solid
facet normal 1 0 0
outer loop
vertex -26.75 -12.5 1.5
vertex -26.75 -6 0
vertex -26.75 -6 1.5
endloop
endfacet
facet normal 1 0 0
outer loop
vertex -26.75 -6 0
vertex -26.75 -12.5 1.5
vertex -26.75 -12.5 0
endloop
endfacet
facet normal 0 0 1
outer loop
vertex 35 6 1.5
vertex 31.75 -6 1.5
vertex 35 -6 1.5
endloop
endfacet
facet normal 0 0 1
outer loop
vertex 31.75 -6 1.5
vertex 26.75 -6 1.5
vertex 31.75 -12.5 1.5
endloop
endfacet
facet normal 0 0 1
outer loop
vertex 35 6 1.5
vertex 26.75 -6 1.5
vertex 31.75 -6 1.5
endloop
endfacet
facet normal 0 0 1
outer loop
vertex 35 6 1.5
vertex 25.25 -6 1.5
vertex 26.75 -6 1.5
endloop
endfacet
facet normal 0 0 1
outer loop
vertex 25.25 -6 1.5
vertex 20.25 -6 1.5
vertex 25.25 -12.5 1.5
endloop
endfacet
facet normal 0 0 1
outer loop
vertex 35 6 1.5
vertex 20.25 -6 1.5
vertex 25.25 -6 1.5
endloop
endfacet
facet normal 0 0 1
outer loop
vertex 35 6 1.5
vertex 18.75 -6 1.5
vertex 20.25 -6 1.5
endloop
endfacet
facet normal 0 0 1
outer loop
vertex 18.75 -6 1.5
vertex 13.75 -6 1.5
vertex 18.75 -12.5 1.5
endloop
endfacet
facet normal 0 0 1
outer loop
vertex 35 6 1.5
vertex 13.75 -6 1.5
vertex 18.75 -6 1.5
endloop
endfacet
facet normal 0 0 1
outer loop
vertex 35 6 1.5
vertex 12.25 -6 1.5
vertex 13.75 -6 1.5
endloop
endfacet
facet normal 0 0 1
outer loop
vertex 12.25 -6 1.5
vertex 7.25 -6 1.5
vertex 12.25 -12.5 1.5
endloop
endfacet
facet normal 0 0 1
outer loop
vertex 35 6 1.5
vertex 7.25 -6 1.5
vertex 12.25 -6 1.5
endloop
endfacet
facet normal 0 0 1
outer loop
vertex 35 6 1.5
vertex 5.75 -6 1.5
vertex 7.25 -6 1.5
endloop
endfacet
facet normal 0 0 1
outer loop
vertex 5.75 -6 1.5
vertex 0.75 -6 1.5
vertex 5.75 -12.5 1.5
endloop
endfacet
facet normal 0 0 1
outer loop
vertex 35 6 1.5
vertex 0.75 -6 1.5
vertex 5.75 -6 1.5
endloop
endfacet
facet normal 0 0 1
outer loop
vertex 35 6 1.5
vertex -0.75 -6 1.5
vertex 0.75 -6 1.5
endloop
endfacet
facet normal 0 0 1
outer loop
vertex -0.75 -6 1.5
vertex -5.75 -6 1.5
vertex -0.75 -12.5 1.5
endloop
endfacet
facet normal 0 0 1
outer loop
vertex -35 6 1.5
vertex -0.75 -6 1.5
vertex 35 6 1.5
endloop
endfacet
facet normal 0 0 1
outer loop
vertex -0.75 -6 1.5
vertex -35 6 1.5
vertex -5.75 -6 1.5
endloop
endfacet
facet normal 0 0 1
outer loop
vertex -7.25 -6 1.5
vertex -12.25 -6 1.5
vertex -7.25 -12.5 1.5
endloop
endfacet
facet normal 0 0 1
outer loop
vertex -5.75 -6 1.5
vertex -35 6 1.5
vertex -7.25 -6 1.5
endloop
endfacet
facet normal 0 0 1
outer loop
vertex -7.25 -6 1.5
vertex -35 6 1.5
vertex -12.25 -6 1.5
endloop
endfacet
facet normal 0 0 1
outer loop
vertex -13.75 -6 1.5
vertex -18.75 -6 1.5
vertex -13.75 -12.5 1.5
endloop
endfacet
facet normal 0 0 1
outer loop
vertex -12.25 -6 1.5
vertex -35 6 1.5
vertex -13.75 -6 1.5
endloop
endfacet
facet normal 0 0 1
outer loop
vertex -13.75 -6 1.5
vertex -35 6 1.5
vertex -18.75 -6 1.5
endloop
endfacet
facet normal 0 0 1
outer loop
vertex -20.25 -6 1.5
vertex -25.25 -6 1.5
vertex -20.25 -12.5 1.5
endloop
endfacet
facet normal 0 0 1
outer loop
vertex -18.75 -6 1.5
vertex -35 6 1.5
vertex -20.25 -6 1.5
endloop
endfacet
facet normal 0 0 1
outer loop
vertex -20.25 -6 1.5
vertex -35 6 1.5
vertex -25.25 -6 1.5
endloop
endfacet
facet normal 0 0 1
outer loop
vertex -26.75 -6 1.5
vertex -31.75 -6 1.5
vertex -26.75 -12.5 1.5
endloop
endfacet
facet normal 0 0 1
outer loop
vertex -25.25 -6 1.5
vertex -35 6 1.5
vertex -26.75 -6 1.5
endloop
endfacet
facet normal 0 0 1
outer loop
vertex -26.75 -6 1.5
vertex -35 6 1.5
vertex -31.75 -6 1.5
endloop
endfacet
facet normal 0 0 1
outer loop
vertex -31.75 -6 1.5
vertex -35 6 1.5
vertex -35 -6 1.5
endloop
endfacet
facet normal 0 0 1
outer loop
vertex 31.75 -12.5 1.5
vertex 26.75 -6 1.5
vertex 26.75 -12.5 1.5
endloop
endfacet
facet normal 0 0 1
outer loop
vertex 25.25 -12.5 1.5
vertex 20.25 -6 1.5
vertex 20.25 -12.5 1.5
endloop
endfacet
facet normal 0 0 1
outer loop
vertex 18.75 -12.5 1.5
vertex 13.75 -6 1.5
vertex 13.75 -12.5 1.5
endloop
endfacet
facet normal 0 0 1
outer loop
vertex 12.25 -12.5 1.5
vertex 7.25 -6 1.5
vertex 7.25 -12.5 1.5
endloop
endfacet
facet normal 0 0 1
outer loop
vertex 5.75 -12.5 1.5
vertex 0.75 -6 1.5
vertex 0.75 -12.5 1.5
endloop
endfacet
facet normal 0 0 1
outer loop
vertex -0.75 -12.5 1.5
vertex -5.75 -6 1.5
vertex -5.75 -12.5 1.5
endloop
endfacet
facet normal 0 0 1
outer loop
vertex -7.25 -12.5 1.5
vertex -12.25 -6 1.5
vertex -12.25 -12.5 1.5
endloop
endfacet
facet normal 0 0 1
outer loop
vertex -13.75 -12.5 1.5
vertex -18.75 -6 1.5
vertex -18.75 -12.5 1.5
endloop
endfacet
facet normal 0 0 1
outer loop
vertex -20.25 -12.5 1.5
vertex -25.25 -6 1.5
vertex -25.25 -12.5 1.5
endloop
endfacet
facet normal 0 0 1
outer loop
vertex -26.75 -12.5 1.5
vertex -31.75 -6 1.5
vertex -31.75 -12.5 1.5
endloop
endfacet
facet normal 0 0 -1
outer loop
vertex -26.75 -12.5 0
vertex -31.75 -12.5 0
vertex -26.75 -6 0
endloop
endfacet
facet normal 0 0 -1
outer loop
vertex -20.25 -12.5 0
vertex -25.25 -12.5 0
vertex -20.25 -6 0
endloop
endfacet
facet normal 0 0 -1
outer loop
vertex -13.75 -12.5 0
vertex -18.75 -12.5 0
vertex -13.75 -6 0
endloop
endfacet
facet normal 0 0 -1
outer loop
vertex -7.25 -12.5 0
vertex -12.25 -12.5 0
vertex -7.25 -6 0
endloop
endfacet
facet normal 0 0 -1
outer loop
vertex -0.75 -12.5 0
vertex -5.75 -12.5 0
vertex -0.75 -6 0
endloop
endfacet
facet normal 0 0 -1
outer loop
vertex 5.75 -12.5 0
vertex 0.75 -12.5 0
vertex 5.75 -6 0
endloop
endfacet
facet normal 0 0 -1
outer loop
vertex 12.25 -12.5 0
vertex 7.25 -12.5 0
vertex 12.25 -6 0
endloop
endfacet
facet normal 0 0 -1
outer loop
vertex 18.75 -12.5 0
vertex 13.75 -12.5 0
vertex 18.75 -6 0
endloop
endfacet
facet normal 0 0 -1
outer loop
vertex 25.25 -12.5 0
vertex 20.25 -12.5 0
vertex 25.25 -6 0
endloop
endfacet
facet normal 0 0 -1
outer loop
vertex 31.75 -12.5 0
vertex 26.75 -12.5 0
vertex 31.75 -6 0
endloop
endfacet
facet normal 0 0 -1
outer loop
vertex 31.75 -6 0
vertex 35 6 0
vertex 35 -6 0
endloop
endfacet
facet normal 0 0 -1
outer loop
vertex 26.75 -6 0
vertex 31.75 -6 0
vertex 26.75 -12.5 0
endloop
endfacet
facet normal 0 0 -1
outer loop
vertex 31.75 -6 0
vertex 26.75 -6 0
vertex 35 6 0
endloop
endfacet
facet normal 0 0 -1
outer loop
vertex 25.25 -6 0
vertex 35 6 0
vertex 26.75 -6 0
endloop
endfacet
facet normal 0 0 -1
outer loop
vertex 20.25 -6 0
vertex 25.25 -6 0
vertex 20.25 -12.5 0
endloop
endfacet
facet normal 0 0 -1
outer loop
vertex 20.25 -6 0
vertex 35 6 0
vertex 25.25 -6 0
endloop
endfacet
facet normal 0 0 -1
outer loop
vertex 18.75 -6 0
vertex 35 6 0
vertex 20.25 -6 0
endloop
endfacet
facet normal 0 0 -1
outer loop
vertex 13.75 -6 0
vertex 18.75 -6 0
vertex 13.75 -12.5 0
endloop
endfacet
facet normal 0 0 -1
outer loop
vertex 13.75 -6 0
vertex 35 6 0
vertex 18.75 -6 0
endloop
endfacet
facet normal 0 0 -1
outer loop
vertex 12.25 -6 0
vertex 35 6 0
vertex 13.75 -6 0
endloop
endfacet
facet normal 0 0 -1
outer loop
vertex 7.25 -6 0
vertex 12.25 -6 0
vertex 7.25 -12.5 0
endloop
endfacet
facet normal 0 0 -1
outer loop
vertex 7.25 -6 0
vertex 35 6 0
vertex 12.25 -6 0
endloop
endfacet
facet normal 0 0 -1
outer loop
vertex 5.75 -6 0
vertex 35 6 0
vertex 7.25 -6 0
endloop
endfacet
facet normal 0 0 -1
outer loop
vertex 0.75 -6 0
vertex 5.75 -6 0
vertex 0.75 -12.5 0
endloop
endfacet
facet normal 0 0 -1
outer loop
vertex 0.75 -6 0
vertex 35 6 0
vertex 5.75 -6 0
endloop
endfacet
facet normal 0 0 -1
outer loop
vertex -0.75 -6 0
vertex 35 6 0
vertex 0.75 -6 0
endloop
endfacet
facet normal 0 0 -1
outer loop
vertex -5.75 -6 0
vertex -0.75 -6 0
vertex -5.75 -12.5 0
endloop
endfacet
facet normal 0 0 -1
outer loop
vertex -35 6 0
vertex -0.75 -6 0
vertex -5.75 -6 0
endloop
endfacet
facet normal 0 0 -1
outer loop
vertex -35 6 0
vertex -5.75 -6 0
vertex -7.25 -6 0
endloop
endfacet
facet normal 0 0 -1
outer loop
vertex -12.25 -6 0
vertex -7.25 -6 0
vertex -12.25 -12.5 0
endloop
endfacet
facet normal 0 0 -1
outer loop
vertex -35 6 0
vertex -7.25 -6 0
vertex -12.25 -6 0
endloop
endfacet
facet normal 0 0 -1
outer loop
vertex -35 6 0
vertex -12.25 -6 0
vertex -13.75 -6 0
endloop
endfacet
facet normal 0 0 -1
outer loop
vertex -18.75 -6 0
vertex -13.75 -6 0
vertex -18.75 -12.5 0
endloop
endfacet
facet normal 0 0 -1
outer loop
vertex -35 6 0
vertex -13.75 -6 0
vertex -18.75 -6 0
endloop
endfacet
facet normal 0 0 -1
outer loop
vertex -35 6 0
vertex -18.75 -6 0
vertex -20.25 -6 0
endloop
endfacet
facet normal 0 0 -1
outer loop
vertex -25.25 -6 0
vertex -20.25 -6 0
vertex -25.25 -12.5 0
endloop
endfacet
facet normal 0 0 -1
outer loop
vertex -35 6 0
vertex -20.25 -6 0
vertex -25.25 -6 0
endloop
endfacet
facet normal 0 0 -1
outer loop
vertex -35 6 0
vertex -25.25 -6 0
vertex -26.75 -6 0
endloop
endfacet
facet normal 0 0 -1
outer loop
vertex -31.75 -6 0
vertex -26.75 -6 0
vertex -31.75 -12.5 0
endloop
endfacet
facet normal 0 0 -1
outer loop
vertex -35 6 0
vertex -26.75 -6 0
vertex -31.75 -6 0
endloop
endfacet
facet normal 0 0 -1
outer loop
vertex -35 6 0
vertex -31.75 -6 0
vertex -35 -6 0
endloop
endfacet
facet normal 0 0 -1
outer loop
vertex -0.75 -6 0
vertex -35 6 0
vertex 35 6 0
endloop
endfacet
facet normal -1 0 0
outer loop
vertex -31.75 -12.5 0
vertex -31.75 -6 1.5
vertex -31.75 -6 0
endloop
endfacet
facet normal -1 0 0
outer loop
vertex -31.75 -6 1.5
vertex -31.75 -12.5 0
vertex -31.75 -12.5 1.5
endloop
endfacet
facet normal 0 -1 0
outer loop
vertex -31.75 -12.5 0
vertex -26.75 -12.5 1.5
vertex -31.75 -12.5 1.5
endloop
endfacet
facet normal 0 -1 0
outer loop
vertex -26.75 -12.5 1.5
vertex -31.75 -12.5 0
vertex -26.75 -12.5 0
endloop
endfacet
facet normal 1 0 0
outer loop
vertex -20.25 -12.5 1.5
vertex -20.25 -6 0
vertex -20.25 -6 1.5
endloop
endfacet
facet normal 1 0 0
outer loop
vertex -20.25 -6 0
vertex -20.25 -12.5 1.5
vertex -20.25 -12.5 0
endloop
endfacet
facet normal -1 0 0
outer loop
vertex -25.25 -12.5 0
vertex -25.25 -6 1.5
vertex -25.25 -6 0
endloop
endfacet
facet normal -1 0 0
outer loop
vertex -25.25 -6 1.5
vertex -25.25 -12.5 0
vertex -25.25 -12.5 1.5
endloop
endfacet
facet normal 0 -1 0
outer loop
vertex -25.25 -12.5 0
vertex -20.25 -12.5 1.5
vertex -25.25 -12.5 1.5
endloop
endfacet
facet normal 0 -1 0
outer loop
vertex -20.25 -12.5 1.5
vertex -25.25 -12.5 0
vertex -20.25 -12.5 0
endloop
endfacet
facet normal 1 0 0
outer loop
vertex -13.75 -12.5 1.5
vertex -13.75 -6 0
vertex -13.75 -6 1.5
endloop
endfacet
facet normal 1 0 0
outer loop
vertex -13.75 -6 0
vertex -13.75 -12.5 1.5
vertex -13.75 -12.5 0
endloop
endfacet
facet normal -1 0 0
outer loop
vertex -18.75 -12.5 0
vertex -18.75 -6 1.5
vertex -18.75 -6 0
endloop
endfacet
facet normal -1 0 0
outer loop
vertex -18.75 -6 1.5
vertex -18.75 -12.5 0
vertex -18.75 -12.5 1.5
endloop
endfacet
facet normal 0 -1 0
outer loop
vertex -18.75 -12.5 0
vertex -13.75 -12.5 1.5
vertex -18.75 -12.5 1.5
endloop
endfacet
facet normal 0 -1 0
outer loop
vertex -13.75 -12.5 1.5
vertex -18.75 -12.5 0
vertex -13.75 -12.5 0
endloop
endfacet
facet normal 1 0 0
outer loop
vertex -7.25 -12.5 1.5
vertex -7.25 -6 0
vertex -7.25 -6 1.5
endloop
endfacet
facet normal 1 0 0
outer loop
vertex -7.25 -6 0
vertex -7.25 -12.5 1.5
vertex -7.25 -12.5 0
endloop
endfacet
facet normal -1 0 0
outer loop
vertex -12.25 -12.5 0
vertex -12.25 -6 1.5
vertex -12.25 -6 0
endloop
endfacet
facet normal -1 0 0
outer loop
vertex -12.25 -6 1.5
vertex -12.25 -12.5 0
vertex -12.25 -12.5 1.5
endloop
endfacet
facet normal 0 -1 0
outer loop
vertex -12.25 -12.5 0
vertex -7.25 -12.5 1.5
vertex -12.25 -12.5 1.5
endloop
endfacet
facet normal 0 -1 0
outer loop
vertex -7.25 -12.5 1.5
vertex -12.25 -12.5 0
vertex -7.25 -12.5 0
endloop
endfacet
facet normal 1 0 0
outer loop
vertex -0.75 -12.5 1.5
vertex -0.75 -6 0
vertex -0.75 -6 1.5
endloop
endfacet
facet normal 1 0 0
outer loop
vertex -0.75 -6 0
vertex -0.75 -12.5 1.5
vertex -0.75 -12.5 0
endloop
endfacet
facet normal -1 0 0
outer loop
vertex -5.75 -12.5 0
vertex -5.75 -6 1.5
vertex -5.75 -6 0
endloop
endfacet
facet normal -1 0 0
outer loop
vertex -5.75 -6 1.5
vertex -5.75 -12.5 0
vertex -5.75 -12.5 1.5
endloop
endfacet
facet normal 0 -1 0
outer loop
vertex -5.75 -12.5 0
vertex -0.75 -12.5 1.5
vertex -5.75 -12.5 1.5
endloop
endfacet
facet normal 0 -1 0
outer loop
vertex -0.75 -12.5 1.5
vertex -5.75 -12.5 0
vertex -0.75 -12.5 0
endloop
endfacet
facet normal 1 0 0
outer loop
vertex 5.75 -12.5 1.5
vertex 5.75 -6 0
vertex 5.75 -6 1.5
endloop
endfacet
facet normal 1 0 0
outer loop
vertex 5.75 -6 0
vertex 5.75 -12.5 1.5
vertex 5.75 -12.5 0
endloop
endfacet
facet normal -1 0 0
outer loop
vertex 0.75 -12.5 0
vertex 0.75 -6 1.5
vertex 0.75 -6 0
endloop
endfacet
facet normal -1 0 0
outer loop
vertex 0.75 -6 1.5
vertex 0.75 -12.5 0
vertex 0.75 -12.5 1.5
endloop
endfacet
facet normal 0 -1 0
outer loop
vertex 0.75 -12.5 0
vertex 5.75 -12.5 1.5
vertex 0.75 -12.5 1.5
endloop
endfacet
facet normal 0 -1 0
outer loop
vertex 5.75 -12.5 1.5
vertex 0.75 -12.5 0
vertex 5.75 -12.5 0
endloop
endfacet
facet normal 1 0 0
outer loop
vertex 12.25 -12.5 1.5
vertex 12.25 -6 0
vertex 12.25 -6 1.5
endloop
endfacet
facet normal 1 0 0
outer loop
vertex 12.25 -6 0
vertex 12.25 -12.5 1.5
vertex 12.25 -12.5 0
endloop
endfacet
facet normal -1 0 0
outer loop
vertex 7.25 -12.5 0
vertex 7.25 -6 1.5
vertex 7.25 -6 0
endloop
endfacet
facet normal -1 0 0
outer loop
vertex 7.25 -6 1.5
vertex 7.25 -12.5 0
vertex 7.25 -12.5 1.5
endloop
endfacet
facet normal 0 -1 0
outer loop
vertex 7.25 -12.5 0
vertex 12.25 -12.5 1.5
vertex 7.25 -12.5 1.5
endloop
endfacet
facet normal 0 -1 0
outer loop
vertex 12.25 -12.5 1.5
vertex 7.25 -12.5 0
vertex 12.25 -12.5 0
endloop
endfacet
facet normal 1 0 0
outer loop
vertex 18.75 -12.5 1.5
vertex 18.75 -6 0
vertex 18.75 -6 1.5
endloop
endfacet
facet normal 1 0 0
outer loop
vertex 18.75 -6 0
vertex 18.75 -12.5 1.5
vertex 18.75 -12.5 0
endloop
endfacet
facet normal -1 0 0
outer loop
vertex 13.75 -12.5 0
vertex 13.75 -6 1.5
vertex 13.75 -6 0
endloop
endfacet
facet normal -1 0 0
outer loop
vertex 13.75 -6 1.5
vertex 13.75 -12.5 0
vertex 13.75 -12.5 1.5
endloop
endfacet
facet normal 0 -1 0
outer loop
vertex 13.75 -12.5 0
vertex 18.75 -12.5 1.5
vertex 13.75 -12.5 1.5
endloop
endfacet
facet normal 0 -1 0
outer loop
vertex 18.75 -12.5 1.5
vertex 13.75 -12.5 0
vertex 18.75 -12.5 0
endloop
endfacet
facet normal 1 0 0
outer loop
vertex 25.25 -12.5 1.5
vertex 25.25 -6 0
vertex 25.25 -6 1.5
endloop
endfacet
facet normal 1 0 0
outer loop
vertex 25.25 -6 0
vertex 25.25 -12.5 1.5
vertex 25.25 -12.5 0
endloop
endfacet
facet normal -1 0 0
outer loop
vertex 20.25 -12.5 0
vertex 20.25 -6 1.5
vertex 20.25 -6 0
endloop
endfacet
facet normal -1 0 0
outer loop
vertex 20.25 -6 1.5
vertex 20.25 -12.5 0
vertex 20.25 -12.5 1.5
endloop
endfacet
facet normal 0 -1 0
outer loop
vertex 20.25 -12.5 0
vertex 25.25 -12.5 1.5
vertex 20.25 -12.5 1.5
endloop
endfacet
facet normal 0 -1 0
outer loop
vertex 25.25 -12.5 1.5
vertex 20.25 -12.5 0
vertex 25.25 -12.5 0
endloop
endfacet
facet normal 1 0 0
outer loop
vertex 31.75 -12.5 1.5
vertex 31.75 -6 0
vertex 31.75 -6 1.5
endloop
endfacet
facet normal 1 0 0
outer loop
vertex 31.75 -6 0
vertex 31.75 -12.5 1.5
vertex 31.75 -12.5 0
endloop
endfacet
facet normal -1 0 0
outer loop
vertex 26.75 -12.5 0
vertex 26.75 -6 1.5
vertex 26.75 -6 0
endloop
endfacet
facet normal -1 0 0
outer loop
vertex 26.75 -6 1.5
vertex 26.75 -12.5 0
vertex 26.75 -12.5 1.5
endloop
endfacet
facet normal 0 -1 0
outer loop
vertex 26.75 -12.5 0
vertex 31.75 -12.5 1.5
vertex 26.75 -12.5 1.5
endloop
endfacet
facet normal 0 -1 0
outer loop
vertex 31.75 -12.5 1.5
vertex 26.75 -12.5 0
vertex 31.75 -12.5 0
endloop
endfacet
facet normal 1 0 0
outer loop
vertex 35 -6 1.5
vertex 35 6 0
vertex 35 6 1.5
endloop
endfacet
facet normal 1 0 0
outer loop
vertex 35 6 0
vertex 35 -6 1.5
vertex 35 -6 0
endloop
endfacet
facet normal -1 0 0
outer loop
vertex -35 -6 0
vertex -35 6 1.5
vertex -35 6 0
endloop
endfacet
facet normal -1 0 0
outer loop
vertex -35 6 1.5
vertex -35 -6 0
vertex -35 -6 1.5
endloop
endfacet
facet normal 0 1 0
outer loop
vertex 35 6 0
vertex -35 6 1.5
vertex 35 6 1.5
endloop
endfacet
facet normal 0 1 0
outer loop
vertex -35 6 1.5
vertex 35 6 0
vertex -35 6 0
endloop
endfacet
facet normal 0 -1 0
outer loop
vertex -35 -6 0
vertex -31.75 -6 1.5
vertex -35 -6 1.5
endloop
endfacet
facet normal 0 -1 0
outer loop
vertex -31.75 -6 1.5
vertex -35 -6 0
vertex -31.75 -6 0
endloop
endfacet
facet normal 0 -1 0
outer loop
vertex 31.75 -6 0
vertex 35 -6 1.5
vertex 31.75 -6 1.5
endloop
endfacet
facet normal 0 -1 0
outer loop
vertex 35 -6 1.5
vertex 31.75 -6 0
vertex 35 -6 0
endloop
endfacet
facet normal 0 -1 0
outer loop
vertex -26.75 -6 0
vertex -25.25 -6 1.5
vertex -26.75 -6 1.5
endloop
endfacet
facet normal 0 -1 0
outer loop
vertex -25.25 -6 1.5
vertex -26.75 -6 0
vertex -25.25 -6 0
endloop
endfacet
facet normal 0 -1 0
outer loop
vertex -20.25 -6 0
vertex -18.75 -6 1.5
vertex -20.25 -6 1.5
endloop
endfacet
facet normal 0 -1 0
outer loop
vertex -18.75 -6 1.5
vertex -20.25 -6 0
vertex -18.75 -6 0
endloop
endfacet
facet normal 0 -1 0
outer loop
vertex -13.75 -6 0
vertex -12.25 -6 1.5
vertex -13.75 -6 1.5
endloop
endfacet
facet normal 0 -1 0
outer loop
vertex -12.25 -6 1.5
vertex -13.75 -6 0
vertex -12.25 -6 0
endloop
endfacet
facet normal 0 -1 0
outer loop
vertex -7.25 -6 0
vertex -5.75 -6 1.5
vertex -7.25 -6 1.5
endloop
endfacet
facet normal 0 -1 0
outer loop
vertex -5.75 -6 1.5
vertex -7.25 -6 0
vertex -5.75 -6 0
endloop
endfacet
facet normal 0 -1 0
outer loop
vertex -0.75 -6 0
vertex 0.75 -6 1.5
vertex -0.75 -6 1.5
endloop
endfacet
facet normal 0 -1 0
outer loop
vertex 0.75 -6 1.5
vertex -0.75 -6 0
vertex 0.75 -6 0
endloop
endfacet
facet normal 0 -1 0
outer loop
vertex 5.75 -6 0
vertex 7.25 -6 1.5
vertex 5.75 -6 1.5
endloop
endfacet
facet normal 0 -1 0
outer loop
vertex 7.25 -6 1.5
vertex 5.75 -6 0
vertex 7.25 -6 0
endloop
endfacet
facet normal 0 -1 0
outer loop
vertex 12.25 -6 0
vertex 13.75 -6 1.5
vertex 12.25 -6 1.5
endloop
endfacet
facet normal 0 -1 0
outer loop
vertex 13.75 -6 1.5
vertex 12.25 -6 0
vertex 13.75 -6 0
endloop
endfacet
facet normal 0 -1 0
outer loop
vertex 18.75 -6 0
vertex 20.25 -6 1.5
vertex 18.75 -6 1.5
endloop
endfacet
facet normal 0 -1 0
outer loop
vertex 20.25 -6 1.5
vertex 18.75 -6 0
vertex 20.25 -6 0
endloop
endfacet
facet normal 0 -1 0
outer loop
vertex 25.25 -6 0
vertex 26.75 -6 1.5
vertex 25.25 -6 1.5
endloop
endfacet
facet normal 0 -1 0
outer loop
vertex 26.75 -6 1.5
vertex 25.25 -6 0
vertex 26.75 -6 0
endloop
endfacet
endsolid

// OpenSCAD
// 10-well comb for agarose gel casting
// Print orientation: flat on bed, teeth pointing down (-Y)

// ---- Parameters ----
tooth_count  = 10;    // number of teeth
tooth_w      = 5.0;   // tooth width (X)
tooth_l      = 12;    // tooth length (Y)
gap          = 1.5;   // gap between teeth (X)
spine_l      = 70;    // spine length (X)
spine_w      = 12;    // spine width (Y)
thickness    = 1.5;   // plate thickness (Z)

eps          = 0.5;   // cutter overshoot
$fn          = 64;

// ---- Derived ----
pitch   = tooth_w + gap;
x_start = -(tooth_count - 1) * pitch / 2;   // first tooth centre

// ---- Model ----
union() {
    // Teeth
    for (i = [0 : tooth_count - 1])
        translate([x_start + i * pitch - tooth_w / 2,
                   -tooth_l - eps,
                   0])
            cube([tooth_w, tooth_l + 2 * eps, thickness]);

    // Spine
    translate([-spine_l / 2, -spine_w / 2, 0])
        cube([spine_l, spine_w, thickness]);
}
